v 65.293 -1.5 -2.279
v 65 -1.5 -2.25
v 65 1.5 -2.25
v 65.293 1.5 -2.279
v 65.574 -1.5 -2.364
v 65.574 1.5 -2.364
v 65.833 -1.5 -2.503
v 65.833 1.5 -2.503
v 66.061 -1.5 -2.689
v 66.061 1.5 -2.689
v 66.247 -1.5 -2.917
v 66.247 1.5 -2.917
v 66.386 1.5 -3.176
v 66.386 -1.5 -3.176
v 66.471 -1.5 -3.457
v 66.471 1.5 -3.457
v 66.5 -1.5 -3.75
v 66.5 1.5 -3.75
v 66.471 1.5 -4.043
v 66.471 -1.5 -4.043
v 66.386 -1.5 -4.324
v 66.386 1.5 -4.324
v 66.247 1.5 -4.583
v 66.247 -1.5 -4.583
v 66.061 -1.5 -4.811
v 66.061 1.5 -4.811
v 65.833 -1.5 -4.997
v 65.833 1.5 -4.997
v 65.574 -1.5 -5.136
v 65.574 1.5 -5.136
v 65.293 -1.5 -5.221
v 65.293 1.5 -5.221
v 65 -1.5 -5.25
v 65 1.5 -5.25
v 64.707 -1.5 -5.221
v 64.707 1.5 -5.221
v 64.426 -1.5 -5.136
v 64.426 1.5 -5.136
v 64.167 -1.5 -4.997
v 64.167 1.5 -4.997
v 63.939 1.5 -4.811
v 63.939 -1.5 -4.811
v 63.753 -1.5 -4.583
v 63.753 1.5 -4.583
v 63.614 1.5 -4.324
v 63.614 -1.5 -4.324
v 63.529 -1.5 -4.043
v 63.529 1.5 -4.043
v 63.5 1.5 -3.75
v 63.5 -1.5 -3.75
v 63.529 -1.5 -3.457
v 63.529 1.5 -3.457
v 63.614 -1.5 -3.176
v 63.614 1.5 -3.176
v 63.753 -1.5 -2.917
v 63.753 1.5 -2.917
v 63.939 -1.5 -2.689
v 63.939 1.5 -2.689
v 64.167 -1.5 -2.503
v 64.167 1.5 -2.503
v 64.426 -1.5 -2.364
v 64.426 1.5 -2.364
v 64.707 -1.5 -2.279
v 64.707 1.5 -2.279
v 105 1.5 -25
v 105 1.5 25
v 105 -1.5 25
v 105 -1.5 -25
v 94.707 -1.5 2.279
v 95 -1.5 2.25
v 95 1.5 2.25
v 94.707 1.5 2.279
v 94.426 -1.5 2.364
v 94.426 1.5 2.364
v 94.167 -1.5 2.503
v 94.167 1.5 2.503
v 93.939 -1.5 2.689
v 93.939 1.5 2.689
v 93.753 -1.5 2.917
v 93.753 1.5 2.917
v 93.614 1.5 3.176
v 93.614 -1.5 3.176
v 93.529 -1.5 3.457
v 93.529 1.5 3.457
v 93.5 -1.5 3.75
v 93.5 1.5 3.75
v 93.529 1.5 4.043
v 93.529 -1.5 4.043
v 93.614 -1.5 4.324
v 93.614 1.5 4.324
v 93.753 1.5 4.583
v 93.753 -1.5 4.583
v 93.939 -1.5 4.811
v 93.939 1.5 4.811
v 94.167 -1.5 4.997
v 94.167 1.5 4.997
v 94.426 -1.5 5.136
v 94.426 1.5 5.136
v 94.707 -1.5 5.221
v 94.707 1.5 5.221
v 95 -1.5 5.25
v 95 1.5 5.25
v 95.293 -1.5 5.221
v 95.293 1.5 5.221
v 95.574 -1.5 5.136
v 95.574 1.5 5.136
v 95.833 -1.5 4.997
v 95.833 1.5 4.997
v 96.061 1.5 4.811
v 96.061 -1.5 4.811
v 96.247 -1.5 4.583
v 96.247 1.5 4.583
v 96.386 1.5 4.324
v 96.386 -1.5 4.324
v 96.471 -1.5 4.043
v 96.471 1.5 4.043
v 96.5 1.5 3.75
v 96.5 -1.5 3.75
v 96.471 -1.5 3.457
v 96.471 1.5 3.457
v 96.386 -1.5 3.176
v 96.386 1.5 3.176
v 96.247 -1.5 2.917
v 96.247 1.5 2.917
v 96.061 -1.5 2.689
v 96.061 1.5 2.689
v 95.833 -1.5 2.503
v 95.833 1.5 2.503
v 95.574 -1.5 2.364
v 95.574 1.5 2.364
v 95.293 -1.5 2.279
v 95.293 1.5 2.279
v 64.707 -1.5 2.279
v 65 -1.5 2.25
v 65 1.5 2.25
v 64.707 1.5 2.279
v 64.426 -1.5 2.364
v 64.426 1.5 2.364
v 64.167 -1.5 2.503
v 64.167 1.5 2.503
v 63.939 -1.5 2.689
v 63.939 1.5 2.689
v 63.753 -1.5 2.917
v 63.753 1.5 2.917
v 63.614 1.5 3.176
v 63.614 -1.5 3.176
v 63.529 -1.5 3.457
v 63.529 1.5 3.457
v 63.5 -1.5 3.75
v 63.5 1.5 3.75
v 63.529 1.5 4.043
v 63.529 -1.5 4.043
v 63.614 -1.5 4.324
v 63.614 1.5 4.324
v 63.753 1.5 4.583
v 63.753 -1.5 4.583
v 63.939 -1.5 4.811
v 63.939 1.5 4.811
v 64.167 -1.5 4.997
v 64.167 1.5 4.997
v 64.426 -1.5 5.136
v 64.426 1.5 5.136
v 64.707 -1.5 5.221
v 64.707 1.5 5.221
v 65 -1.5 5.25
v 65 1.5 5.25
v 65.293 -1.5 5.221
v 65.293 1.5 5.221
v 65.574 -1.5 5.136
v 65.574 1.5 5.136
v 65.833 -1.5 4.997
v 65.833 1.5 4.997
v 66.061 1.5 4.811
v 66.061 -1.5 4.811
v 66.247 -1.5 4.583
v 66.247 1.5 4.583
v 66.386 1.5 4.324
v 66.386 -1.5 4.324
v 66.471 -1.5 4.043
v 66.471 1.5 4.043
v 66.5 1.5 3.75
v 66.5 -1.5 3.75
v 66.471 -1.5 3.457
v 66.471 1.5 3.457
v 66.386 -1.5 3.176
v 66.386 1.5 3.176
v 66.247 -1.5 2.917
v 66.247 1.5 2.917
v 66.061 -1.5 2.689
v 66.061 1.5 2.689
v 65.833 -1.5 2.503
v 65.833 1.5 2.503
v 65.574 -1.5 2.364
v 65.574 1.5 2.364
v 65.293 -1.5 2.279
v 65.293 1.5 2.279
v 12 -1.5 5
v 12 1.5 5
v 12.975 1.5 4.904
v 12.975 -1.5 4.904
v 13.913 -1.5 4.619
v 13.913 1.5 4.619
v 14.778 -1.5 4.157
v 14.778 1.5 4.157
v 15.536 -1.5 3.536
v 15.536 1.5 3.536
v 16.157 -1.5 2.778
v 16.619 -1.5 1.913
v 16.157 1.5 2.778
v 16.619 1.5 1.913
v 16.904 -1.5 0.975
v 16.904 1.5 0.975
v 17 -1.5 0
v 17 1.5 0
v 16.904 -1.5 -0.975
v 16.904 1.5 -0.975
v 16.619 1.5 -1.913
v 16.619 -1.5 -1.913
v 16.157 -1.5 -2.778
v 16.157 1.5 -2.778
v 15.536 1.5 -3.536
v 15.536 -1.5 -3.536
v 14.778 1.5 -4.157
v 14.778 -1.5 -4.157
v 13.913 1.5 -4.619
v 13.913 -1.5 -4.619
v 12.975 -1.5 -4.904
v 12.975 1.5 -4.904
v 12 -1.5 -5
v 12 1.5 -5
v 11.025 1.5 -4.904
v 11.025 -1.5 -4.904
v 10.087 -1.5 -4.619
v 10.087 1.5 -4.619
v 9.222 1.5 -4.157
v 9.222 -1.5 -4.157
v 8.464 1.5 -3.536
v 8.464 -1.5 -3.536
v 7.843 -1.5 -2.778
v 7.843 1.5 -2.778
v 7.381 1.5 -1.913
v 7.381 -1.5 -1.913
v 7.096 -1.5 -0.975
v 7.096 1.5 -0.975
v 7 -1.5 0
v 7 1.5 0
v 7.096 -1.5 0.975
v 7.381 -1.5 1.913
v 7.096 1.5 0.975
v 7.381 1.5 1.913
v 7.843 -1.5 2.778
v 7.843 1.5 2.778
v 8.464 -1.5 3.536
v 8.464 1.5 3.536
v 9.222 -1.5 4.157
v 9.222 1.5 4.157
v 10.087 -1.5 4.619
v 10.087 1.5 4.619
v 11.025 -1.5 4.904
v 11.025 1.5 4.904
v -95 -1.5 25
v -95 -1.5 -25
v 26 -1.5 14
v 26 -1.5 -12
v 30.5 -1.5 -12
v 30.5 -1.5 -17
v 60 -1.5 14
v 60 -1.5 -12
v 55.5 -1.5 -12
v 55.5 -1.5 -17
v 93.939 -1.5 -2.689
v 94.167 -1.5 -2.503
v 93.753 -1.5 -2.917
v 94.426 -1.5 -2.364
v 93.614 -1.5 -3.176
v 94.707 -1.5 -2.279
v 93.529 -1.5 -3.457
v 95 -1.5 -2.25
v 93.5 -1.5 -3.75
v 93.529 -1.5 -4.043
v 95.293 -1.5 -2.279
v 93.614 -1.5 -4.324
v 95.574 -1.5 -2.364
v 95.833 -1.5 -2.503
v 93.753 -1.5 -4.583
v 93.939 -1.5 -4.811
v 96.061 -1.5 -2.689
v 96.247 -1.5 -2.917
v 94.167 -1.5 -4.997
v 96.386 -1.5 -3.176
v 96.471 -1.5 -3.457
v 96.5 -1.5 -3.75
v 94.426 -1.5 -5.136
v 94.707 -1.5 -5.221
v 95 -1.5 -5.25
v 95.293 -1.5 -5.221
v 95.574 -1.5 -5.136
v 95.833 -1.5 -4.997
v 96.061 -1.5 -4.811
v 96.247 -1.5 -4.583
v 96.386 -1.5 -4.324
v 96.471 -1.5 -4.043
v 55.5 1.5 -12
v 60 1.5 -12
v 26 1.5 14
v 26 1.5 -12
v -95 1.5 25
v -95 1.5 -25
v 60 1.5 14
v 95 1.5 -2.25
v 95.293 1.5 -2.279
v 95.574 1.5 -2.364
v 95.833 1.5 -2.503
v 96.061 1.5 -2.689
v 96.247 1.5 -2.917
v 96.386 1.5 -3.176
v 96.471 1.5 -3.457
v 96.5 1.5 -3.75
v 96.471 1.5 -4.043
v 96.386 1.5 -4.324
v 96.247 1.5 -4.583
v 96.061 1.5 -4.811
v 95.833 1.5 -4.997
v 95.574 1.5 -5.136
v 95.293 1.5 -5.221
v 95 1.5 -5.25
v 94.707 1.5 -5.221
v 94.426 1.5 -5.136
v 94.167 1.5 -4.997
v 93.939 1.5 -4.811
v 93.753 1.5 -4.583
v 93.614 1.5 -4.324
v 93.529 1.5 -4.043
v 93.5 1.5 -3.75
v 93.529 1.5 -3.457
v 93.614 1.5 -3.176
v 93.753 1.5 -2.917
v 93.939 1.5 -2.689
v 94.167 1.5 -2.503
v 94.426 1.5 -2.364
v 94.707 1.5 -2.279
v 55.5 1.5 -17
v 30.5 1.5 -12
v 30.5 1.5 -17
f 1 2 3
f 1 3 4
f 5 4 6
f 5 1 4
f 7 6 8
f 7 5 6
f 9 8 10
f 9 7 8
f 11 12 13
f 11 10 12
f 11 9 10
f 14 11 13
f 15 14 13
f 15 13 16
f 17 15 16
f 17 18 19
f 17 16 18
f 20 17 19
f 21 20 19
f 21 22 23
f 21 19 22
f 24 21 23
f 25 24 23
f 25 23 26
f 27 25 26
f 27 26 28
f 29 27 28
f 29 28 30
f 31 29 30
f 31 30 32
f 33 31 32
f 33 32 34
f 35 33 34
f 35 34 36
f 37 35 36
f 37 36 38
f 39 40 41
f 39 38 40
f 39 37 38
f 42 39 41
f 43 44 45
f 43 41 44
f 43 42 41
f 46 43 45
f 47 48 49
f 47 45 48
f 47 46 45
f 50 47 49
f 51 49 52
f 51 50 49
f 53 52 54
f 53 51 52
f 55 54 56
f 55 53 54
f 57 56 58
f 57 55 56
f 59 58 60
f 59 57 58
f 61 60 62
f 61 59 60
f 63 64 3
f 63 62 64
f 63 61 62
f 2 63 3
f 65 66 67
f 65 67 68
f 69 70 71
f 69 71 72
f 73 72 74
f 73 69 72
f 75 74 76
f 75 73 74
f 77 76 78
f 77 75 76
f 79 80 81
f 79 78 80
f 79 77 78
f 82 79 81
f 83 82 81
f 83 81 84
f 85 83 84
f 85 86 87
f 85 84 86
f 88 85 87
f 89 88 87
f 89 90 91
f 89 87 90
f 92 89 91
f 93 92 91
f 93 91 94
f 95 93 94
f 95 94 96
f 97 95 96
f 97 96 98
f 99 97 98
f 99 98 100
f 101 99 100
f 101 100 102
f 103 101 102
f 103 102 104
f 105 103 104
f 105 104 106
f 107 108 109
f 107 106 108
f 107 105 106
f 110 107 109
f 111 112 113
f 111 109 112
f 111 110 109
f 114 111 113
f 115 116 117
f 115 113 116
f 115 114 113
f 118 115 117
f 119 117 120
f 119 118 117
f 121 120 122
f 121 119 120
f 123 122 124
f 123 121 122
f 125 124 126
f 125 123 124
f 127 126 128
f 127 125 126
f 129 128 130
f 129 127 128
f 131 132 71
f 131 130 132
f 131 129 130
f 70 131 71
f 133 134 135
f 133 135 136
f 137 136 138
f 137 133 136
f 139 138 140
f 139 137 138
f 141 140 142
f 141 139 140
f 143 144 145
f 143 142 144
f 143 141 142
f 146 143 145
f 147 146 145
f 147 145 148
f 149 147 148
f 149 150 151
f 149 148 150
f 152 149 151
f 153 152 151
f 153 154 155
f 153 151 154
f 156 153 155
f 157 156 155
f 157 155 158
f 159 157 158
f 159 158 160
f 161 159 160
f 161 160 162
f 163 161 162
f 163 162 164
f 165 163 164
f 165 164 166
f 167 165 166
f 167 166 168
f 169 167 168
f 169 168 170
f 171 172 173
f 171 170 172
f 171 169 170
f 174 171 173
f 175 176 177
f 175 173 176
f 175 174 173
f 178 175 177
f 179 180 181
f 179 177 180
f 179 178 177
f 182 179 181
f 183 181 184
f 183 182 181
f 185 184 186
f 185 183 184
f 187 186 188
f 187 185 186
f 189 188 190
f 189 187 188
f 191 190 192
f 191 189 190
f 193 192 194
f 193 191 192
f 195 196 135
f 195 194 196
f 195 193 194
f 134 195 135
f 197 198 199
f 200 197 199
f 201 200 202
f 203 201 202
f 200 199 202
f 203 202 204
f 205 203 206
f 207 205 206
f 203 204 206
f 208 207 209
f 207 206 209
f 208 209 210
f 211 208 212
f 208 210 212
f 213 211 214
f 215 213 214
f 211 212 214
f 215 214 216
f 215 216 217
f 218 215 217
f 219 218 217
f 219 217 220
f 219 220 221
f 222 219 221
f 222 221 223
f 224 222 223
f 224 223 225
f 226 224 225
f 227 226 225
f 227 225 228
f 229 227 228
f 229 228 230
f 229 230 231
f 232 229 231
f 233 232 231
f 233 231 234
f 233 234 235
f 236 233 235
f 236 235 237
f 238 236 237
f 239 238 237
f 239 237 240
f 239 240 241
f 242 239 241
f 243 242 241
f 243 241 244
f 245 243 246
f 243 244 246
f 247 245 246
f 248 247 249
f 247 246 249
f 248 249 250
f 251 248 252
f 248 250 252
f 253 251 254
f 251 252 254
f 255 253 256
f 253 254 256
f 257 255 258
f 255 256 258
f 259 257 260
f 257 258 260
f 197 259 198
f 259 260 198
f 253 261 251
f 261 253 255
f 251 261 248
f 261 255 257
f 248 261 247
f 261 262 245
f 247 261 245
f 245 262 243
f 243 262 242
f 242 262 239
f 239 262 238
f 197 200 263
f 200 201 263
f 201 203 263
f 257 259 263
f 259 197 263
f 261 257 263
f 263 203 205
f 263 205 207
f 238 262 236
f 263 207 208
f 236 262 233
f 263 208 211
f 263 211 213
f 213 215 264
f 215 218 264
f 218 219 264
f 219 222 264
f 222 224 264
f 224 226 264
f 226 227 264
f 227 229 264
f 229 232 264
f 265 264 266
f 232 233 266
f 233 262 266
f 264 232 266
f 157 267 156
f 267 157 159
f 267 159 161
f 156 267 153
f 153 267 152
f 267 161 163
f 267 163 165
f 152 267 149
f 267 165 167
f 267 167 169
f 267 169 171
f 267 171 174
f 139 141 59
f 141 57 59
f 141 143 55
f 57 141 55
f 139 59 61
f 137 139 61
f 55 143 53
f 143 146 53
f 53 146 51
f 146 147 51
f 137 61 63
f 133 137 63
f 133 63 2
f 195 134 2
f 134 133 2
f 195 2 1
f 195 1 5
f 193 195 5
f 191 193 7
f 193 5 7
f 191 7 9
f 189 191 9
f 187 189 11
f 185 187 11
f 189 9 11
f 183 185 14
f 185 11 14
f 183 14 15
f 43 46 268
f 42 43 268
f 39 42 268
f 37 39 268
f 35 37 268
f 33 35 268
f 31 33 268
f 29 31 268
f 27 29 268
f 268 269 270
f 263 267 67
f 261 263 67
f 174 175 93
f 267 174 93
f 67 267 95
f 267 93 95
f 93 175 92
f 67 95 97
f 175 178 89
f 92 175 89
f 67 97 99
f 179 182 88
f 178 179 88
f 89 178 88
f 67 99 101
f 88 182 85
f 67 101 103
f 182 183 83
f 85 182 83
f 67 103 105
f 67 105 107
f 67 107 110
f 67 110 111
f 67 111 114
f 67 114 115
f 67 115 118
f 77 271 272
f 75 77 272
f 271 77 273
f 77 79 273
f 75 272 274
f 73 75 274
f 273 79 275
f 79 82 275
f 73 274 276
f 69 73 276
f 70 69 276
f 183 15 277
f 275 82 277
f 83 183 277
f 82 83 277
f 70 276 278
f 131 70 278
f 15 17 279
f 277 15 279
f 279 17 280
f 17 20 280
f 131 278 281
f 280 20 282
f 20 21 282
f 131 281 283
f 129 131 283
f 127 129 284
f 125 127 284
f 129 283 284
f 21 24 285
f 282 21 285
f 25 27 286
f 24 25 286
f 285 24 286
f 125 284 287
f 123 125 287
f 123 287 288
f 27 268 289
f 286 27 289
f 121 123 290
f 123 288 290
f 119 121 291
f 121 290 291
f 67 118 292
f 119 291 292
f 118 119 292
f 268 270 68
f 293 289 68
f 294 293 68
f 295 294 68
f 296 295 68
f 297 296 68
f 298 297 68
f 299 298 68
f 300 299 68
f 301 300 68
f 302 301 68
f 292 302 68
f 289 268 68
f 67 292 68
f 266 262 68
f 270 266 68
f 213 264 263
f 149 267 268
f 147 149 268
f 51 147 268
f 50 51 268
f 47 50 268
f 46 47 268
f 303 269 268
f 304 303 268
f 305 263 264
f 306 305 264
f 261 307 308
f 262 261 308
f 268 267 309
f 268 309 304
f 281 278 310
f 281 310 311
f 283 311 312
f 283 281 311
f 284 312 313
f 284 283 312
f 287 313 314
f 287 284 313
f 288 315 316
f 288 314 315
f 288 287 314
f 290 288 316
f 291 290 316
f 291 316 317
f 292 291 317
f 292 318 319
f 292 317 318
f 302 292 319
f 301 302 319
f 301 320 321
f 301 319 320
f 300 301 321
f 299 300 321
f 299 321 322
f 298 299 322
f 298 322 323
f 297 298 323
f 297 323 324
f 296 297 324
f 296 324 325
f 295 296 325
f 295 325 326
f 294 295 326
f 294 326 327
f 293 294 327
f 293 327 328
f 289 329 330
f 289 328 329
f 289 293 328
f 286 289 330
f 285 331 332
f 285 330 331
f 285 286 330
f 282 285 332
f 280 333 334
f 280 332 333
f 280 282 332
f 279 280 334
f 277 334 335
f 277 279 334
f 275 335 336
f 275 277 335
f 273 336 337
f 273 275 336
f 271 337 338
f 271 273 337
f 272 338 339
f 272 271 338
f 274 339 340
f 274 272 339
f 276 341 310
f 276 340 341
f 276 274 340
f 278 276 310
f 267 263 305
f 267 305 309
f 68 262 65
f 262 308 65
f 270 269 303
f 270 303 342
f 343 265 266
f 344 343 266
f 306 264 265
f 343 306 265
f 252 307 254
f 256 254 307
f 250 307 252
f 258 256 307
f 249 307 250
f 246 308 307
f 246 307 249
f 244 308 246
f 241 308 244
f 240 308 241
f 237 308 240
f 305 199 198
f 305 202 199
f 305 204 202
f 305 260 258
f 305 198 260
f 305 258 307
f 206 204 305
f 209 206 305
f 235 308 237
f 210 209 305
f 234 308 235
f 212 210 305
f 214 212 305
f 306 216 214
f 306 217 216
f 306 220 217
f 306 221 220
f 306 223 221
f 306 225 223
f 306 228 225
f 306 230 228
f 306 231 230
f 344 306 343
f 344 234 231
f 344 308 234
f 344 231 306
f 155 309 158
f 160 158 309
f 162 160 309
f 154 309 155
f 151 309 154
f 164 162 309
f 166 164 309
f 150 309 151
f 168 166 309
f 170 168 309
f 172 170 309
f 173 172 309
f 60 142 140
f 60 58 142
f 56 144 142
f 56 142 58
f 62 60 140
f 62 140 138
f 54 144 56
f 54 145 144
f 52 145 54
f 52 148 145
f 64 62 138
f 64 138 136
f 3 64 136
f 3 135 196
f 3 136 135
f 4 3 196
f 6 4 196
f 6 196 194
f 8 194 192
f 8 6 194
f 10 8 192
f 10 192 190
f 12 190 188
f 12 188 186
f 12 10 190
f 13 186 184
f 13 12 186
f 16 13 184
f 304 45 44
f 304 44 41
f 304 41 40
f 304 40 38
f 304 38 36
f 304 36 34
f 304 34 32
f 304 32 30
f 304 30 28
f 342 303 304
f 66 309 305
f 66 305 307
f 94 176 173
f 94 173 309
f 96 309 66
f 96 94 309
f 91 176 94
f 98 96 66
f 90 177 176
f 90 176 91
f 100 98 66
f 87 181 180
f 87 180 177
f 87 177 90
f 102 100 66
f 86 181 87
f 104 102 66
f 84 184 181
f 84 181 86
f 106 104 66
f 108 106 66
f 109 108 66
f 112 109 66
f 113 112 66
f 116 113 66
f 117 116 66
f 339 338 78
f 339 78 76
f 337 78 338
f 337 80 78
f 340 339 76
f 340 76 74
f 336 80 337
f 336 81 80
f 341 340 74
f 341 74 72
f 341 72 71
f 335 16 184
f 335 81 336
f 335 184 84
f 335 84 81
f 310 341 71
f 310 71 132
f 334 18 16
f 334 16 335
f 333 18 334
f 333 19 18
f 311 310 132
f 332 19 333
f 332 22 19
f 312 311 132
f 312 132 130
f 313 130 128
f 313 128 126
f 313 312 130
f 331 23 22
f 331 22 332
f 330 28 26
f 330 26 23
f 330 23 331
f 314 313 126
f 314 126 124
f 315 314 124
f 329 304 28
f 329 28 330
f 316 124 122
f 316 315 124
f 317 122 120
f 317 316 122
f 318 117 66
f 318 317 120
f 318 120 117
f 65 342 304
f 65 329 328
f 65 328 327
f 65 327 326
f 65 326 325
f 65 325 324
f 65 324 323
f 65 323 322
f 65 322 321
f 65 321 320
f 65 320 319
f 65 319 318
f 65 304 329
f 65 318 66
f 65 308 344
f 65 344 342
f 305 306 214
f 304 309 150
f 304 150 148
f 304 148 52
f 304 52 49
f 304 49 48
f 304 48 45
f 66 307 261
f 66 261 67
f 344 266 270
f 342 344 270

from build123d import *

# Parameters (mm, degrees)
SKETCH1_W               = 200
SKETCH1_H               = 50
BOSS_EXTRUDE1_DEPTH     = 1.5
SKETCH3_R               = 5
CUT_EXTRUDE2_DEPTH      = 108.976849371
CUT_EXTRUDE3_DEPTH      = 108.976849371
CUT_EXTRUDE3_DEPTH_BACK = 108.976849371
SKETCH4_R               = 1.5
CUT_EXTRUDE4_DEPTH      = 108.976849371
CUT_EXTRUDE4_DEPTH_BACK = 108.976849371
SKETCH5_W               = 34
SKETCH5_H               = 26
CUT_EXTRUDE5_DEPTH      = 108.976849371
CUT_EXTRUDE5_DEPTH_BACK = 108.976849371
SKETCH6_W               = 25
SKETCH6_H               = 5


with BuildPart() as part:
    # Sketch1 → Boss-Extrude1 (new, symmetric)
    with BuildSketch(Plane(origin=(0, 0, 0), x_dir=(1, 0, 0), z_dir=(0, 1, 0))):
        with Locations((5, 0)):
            Rectangle(SKETCH1_W, SKETCH1_H)
    extrude(amount=BOSS_EXTRUDE1_DEPTH, both=True)

    # Sketch3 → Cut-Extrude2 (cut, through all)
    with BuildSketch(Plane(origin=(0, 1.5, 0), x_dir=(1, 0, 0), z_dir=(0, 1, 0))):
        with Locations(Location((12, 0, 0), (0, 0, 270))):
            Circle(SKETCH3_R)
    extrude(amount=-CUT_EXTRUDE2_DEPTH, mode=Mode.SUBTRACT)

    # Sketch4 → Cut-Extrude3 (cut, two sides: drawn at the far end of the back side and taken through both)
    with BuildSketch(Plane(origin=(0, 1.5, 0), x_dir=(1, 0, 0), z_dir=(0, 1, 0)).offset(-CUT_EXTRUDE3_DEPTH_BACK)):
        with Locations(Location((65, 3.75, 0), (0, 0, 270))):
            Circle(SKETCH4_R)
        with Locations(Location((95, 3.75, 0), (0, 0, 270))):
            Circle(SKETCH4_R)
        with Locations(Location((95, -3.75, 0), (0, 0, 90))):
            Circle(SKETCH4_R)
        with Locations(Location((65, -3.75, 0), (0, 0, 90))):
            Circle(SKETCH4_R)
    extrude(amount=CUT_EXTRUDE3_DEPTH + CUT_EXTRUDE3_DEPTH_BACK, mode=Mode.SUBTRACT)

    # Sketch5 → Cut-Extrude4 (cut, two sides: drawn at the far end of the back side and taken through both)
    with BuildSketch(Plane(origin=(0, 1.5, 0), x_dir=(1, 0, 0), z_dir=(0, 1, 0)).offset(-CUT_EXTRUDE4_DEPTH_BACK)):
        with Locations((43, -1)):
            Rectangle(SKETCH5_W, SKETCH5_H)
    extrude(amount=CUT_EXTRUDE4_DEPTH + CUT_EXTRUDE4_DEPTH_BACK, mode=Mode.SUBTRACT)

    # Sketch6 → Cut-Extrude5 (cut, two sides: drawn at the far end of the back side and taken through both)
    with BuildSketch(Plane(origin=(0, 1.5, 0), x_dir=(1, 0, 0), z_dir=(0, 1, 0)).offset(-CUT_EXTRUDE5_DEPTH_BACK)):
        with Locations((43, 14.5)):
            Rectangle(SKETCH6_W, SKETCH6_H)
    extrude(amount=CUT_EXTRUDE5_DEPTH + CUT_EXTRUDE5_DEPTH_BACK, mode=Mode.SUBTRACT)


solid = part.part
